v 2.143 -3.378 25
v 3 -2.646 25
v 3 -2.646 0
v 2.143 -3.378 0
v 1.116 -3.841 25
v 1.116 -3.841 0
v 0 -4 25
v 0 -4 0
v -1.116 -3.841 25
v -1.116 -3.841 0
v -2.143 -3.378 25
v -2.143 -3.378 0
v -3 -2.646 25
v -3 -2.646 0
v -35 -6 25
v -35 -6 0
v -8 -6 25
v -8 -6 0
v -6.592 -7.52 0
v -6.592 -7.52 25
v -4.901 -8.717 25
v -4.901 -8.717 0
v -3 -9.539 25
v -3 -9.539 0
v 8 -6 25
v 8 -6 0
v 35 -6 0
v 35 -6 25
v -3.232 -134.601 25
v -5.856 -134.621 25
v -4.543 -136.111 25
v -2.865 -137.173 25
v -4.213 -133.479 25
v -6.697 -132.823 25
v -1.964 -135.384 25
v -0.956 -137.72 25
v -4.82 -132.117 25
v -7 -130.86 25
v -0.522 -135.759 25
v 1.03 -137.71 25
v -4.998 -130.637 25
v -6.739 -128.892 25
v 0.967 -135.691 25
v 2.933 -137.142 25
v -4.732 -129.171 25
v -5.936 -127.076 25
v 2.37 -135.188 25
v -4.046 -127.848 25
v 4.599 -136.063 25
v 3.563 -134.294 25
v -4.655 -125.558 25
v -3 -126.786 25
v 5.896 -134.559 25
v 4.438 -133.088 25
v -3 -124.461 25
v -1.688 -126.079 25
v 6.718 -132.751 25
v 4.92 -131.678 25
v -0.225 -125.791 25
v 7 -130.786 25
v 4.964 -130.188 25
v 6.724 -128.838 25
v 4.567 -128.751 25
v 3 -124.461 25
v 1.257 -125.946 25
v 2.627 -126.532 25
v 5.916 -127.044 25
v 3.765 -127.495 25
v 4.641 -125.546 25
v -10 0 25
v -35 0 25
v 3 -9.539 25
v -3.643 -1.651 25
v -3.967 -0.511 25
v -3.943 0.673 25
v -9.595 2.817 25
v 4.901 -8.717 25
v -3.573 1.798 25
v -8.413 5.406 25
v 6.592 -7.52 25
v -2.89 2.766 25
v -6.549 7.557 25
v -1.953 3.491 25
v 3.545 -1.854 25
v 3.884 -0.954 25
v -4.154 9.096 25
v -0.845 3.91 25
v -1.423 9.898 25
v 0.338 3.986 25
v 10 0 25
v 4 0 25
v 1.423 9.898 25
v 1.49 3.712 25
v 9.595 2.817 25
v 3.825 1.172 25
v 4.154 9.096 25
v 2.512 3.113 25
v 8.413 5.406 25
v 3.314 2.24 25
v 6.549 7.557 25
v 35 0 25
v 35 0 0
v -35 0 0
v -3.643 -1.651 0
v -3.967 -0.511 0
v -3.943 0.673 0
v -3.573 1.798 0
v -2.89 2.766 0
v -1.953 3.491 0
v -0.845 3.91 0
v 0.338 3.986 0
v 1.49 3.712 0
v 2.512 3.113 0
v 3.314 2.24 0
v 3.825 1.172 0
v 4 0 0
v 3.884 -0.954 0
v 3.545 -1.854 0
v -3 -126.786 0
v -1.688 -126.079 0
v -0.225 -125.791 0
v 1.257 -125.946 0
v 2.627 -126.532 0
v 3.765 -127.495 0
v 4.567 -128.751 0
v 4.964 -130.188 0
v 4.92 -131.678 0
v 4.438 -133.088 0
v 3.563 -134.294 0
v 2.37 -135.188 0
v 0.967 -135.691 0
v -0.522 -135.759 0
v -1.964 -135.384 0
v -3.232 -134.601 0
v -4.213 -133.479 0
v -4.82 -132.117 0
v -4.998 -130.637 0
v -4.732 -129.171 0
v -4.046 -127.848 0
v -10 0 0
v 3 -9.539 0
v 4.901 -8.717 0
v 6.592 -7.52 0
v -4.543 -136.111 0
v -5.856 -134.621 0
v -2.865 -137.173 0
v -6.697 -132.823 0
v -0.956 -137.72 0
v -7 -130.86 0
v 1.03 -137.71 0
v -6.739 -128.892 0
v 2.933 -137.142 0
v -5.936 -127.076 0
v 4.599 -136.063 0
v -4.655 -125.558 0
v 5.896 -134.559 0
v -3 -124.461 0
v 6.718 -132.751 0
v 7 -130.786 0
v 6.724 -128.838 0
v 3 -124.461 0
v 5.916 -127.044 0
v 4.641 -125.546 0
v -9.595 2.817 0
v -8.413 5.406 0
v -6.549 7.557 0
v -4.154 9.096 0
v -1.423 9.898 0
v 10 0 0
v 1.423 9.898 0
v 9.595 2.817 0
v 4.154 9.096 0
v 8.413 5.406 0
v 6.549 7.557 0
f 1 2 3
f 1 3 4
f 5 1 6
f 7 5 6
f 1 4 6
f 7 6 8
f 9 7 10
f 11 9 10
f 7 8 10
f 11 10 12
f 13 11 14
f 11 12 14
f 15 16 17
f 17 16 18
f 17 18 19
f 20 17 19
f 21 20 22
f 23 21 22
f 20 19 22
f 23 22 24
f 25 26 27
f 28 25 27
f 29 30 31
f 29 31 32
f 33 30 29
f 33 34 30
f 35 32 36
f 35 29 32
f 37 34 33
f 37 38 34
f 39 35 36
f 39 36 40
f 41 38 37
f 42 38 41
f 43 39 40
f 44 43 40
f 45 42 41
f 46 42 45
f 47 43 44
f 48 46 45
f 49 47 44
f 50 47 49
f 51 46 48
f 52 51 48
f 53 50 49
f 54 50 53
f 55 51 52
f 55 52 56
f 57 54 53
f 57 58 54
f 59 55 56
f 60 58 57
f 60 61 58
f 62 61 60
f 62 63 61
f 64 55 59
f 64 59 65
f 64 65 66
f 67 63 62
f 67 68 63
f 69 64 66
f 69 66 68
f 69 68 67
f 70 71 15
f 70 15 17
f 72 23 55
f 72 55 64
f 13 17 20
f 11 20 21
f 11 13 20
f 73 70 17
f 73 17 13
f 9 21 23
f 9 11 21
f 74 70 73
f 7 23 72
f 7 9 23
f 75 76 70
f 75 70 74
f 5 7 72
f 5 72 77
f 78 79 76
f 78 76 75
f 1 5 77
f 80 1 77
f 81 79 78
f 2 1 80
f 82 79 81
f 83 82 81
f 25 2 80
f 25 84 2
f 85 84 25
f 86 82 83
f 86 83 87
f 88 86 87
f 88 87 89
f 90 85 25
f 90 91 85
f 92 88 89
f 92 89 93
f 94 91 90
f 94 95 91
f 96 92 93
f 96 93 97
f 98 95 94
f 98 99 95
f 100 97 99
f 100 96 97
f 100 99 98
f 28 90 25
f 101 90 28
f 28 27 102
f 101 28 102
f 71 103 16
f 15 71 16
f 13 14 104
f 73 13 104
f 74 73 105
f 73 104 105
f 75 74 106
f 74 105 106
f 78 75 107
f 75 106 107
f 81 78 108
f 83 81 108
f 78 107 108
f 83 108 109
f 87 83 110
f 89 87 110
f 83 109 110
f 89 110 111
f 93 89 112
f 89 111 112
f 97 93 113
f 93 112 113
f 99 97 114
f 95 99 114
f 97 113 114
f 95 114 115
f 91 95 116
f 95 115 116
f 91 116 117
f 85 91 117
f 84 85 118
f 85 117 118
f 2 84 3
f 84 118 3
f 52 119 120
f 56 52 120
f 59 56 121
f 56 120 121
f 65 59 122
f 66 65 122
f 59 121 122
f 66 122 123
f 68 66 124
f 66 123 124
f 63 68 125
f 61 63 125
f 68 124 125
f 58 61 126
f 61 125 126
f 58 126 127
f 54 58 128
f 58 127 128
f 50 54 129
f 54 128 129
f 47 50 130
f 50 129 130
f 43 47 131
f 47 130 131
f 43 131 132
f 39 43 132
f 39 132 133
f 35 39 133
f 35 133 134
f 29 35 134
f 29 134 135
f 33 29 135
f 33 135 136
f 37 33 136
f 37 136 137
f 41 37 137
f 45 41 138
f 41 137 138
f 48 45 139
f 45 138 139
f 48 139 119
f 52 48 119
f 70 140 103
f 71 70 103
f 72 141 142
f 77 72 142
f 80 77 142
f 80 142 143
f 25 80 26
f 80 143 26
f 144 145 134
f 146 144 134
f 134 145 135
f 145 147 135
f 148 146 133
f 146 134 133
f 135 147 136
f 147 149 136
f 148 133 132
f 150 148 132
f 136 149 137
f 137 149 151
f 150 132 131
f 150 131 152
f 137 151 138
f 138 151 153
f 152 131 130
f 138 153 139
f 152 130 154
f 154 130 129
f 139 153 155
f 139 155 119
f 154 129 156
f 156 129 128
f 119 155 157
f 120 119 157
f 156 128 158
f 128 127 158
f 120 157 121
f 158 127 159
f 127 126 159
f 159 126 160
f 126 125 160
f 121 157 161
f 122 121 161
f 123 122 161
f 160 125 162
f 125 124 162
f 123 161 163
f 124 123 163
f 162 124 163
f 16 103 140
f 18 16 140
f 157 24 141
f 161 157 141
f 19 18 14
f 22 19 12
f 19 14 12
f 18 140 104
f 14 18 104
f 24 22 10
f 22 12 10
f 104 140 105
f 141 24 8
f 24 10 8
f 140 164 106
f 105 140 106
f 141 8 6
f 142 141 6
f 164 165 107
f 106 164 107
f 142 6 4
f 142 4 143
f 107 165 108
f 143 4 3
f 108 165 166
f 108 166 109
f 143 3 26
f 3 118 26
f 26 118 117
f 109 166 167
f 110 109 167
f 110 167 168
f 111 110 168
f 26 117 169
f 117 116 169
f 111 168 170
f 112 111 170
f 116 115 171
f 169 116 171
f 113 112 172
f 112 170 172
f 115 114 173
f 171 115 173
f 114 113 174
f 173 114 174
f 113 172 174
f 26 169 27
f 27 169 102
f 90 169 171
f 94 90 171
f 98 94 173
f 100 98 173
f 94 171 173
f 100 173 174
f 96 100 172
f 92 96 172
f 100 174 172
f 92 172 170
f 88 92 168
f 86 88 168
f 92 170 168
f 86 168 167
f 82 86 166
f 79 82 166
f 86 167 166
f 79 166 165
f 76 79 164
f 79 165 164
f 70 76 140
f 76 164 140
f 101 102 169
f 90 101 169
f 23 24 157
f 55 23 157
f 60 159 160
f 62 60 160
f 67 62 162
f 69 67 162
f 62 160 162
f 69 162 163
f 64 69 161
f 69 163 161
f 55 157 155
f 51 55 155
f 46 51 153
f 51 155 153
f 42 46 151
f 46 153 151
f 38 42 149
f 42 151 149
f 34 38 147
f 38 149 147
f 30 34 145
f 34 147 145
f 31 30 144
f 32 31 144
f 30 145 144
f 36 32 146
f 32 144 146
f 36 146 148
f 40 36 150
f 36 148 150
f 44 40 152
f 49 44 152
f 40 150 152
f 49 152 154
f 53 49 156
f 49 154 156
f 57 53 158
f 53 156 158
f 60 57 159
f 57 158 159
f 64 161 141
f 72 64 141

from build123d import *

# Parameters (mm, degrees)
F1_DEPTH = 25
F3_DEPTH = 25


# Not quite as in the source:
# - a feature names something its author has since deleted; it is built from what else it names


with BuildPart() as f1:
    # F0 (on Top) → F1 (new body)
    with BuildSketch(Plane.XY):
        with BuildLine():
            Line((-3, -126.7858377695), (-3, -124.4612824492))
            ThreePointArc((-3, -124.4612824492), (-3.7416573868, -136.7019175526), (7, -130.7858377695))
            ThreePointArc((7, -130.7858377695), (5.9160797831, -127.0441803827), (3, -124.4612824492))
            Line((3, -124.4612824492), (3, -126.7858377695))
            ThreePointArc((3, -126.7858377695), (4.472135955, -128.549769792), (5, -130.7858377695))
            ThreePointArc((5, -130.7858377695), (-2.2360679775, -135.2579737245), (-3, -126.7858377695))
        make_face()
        with BuildLine():
            ThreePointArc((3, -9.5393920142), (0, -10), (-3, -9.5393920142))
            Line((-3, -9.5393920142), (-3, -124.4612824492))
            ThreePointArc((-3, -124.4612824492), (0, -123.7858377695), (3, -124.4612824492))
            Line((3, -124.4612824492), (3, -9.5393920142))
        make_face()
        with BuildLine():
            ThreePointArc((3, -124.4612824492), (0, -123.7858377695), (-3, -124.4612824492))
            Line((-3, -124.4612824492), (-3, -126.7858377695))
            ThreePointArc((-3, -126.7858377695), (0, -125.7858377695), (3, -126.7858377695))
            Line((3, -126.7858377695), (3, -124.4612824492))
        make_face()
        with BuildLine():
            ThreePointArc((-3, -2.6457513111), (-1.4142135624, 3.7416573868), (4, 0))
            ThreePointArc((4, 0), (3.7416573868, -1.4142135624), (3, -2.6457513111))
            Line((3, -2.6457513111), (3, -9.5393920142))
            ThreePointArc((3, -9.5393920142), (8.0622577483, -5.9160797831), (10, 0))
            ThreePointArc((10, 0), (-5.9160797831, 8.0622577483), (-3, -9.5393920142))
            Line((-3, -9.5393920142), (-3, -2.6457513111))
        make_face()
        with BuildLine():
            ThreePointArc((3, -2.6457513111), (0, -4), (-3, -2.6457513111))
            Line((-3, -2.6457513111), (-3, -9.5393920142))
            ThreePointArc((-3, -9.5393920142), (0, -10), (3, -9.5393920142))
            Line((3, -9.5393920142), (3, -2.6457513111))
        make_face()
    extrude(amount=F1_DEPTH)

    # F2 (on Top) → F3 (join)
    with BuildSketch(Plane.XY):
        with BuildLine():
            Line((35, 0), (4, 0))
            ThreePointArc((4, 0), (0, -4), (-4, 0))
            Line((-4, 0), (-35, 0))
            Line((-35, 0), (-35, -6))
            Line((-35, -6), (35, -6))
            Line((35, -6), (35, 0))
        make_face()
    extrude(amount=F3_DEPTH)


solid = f1.part
